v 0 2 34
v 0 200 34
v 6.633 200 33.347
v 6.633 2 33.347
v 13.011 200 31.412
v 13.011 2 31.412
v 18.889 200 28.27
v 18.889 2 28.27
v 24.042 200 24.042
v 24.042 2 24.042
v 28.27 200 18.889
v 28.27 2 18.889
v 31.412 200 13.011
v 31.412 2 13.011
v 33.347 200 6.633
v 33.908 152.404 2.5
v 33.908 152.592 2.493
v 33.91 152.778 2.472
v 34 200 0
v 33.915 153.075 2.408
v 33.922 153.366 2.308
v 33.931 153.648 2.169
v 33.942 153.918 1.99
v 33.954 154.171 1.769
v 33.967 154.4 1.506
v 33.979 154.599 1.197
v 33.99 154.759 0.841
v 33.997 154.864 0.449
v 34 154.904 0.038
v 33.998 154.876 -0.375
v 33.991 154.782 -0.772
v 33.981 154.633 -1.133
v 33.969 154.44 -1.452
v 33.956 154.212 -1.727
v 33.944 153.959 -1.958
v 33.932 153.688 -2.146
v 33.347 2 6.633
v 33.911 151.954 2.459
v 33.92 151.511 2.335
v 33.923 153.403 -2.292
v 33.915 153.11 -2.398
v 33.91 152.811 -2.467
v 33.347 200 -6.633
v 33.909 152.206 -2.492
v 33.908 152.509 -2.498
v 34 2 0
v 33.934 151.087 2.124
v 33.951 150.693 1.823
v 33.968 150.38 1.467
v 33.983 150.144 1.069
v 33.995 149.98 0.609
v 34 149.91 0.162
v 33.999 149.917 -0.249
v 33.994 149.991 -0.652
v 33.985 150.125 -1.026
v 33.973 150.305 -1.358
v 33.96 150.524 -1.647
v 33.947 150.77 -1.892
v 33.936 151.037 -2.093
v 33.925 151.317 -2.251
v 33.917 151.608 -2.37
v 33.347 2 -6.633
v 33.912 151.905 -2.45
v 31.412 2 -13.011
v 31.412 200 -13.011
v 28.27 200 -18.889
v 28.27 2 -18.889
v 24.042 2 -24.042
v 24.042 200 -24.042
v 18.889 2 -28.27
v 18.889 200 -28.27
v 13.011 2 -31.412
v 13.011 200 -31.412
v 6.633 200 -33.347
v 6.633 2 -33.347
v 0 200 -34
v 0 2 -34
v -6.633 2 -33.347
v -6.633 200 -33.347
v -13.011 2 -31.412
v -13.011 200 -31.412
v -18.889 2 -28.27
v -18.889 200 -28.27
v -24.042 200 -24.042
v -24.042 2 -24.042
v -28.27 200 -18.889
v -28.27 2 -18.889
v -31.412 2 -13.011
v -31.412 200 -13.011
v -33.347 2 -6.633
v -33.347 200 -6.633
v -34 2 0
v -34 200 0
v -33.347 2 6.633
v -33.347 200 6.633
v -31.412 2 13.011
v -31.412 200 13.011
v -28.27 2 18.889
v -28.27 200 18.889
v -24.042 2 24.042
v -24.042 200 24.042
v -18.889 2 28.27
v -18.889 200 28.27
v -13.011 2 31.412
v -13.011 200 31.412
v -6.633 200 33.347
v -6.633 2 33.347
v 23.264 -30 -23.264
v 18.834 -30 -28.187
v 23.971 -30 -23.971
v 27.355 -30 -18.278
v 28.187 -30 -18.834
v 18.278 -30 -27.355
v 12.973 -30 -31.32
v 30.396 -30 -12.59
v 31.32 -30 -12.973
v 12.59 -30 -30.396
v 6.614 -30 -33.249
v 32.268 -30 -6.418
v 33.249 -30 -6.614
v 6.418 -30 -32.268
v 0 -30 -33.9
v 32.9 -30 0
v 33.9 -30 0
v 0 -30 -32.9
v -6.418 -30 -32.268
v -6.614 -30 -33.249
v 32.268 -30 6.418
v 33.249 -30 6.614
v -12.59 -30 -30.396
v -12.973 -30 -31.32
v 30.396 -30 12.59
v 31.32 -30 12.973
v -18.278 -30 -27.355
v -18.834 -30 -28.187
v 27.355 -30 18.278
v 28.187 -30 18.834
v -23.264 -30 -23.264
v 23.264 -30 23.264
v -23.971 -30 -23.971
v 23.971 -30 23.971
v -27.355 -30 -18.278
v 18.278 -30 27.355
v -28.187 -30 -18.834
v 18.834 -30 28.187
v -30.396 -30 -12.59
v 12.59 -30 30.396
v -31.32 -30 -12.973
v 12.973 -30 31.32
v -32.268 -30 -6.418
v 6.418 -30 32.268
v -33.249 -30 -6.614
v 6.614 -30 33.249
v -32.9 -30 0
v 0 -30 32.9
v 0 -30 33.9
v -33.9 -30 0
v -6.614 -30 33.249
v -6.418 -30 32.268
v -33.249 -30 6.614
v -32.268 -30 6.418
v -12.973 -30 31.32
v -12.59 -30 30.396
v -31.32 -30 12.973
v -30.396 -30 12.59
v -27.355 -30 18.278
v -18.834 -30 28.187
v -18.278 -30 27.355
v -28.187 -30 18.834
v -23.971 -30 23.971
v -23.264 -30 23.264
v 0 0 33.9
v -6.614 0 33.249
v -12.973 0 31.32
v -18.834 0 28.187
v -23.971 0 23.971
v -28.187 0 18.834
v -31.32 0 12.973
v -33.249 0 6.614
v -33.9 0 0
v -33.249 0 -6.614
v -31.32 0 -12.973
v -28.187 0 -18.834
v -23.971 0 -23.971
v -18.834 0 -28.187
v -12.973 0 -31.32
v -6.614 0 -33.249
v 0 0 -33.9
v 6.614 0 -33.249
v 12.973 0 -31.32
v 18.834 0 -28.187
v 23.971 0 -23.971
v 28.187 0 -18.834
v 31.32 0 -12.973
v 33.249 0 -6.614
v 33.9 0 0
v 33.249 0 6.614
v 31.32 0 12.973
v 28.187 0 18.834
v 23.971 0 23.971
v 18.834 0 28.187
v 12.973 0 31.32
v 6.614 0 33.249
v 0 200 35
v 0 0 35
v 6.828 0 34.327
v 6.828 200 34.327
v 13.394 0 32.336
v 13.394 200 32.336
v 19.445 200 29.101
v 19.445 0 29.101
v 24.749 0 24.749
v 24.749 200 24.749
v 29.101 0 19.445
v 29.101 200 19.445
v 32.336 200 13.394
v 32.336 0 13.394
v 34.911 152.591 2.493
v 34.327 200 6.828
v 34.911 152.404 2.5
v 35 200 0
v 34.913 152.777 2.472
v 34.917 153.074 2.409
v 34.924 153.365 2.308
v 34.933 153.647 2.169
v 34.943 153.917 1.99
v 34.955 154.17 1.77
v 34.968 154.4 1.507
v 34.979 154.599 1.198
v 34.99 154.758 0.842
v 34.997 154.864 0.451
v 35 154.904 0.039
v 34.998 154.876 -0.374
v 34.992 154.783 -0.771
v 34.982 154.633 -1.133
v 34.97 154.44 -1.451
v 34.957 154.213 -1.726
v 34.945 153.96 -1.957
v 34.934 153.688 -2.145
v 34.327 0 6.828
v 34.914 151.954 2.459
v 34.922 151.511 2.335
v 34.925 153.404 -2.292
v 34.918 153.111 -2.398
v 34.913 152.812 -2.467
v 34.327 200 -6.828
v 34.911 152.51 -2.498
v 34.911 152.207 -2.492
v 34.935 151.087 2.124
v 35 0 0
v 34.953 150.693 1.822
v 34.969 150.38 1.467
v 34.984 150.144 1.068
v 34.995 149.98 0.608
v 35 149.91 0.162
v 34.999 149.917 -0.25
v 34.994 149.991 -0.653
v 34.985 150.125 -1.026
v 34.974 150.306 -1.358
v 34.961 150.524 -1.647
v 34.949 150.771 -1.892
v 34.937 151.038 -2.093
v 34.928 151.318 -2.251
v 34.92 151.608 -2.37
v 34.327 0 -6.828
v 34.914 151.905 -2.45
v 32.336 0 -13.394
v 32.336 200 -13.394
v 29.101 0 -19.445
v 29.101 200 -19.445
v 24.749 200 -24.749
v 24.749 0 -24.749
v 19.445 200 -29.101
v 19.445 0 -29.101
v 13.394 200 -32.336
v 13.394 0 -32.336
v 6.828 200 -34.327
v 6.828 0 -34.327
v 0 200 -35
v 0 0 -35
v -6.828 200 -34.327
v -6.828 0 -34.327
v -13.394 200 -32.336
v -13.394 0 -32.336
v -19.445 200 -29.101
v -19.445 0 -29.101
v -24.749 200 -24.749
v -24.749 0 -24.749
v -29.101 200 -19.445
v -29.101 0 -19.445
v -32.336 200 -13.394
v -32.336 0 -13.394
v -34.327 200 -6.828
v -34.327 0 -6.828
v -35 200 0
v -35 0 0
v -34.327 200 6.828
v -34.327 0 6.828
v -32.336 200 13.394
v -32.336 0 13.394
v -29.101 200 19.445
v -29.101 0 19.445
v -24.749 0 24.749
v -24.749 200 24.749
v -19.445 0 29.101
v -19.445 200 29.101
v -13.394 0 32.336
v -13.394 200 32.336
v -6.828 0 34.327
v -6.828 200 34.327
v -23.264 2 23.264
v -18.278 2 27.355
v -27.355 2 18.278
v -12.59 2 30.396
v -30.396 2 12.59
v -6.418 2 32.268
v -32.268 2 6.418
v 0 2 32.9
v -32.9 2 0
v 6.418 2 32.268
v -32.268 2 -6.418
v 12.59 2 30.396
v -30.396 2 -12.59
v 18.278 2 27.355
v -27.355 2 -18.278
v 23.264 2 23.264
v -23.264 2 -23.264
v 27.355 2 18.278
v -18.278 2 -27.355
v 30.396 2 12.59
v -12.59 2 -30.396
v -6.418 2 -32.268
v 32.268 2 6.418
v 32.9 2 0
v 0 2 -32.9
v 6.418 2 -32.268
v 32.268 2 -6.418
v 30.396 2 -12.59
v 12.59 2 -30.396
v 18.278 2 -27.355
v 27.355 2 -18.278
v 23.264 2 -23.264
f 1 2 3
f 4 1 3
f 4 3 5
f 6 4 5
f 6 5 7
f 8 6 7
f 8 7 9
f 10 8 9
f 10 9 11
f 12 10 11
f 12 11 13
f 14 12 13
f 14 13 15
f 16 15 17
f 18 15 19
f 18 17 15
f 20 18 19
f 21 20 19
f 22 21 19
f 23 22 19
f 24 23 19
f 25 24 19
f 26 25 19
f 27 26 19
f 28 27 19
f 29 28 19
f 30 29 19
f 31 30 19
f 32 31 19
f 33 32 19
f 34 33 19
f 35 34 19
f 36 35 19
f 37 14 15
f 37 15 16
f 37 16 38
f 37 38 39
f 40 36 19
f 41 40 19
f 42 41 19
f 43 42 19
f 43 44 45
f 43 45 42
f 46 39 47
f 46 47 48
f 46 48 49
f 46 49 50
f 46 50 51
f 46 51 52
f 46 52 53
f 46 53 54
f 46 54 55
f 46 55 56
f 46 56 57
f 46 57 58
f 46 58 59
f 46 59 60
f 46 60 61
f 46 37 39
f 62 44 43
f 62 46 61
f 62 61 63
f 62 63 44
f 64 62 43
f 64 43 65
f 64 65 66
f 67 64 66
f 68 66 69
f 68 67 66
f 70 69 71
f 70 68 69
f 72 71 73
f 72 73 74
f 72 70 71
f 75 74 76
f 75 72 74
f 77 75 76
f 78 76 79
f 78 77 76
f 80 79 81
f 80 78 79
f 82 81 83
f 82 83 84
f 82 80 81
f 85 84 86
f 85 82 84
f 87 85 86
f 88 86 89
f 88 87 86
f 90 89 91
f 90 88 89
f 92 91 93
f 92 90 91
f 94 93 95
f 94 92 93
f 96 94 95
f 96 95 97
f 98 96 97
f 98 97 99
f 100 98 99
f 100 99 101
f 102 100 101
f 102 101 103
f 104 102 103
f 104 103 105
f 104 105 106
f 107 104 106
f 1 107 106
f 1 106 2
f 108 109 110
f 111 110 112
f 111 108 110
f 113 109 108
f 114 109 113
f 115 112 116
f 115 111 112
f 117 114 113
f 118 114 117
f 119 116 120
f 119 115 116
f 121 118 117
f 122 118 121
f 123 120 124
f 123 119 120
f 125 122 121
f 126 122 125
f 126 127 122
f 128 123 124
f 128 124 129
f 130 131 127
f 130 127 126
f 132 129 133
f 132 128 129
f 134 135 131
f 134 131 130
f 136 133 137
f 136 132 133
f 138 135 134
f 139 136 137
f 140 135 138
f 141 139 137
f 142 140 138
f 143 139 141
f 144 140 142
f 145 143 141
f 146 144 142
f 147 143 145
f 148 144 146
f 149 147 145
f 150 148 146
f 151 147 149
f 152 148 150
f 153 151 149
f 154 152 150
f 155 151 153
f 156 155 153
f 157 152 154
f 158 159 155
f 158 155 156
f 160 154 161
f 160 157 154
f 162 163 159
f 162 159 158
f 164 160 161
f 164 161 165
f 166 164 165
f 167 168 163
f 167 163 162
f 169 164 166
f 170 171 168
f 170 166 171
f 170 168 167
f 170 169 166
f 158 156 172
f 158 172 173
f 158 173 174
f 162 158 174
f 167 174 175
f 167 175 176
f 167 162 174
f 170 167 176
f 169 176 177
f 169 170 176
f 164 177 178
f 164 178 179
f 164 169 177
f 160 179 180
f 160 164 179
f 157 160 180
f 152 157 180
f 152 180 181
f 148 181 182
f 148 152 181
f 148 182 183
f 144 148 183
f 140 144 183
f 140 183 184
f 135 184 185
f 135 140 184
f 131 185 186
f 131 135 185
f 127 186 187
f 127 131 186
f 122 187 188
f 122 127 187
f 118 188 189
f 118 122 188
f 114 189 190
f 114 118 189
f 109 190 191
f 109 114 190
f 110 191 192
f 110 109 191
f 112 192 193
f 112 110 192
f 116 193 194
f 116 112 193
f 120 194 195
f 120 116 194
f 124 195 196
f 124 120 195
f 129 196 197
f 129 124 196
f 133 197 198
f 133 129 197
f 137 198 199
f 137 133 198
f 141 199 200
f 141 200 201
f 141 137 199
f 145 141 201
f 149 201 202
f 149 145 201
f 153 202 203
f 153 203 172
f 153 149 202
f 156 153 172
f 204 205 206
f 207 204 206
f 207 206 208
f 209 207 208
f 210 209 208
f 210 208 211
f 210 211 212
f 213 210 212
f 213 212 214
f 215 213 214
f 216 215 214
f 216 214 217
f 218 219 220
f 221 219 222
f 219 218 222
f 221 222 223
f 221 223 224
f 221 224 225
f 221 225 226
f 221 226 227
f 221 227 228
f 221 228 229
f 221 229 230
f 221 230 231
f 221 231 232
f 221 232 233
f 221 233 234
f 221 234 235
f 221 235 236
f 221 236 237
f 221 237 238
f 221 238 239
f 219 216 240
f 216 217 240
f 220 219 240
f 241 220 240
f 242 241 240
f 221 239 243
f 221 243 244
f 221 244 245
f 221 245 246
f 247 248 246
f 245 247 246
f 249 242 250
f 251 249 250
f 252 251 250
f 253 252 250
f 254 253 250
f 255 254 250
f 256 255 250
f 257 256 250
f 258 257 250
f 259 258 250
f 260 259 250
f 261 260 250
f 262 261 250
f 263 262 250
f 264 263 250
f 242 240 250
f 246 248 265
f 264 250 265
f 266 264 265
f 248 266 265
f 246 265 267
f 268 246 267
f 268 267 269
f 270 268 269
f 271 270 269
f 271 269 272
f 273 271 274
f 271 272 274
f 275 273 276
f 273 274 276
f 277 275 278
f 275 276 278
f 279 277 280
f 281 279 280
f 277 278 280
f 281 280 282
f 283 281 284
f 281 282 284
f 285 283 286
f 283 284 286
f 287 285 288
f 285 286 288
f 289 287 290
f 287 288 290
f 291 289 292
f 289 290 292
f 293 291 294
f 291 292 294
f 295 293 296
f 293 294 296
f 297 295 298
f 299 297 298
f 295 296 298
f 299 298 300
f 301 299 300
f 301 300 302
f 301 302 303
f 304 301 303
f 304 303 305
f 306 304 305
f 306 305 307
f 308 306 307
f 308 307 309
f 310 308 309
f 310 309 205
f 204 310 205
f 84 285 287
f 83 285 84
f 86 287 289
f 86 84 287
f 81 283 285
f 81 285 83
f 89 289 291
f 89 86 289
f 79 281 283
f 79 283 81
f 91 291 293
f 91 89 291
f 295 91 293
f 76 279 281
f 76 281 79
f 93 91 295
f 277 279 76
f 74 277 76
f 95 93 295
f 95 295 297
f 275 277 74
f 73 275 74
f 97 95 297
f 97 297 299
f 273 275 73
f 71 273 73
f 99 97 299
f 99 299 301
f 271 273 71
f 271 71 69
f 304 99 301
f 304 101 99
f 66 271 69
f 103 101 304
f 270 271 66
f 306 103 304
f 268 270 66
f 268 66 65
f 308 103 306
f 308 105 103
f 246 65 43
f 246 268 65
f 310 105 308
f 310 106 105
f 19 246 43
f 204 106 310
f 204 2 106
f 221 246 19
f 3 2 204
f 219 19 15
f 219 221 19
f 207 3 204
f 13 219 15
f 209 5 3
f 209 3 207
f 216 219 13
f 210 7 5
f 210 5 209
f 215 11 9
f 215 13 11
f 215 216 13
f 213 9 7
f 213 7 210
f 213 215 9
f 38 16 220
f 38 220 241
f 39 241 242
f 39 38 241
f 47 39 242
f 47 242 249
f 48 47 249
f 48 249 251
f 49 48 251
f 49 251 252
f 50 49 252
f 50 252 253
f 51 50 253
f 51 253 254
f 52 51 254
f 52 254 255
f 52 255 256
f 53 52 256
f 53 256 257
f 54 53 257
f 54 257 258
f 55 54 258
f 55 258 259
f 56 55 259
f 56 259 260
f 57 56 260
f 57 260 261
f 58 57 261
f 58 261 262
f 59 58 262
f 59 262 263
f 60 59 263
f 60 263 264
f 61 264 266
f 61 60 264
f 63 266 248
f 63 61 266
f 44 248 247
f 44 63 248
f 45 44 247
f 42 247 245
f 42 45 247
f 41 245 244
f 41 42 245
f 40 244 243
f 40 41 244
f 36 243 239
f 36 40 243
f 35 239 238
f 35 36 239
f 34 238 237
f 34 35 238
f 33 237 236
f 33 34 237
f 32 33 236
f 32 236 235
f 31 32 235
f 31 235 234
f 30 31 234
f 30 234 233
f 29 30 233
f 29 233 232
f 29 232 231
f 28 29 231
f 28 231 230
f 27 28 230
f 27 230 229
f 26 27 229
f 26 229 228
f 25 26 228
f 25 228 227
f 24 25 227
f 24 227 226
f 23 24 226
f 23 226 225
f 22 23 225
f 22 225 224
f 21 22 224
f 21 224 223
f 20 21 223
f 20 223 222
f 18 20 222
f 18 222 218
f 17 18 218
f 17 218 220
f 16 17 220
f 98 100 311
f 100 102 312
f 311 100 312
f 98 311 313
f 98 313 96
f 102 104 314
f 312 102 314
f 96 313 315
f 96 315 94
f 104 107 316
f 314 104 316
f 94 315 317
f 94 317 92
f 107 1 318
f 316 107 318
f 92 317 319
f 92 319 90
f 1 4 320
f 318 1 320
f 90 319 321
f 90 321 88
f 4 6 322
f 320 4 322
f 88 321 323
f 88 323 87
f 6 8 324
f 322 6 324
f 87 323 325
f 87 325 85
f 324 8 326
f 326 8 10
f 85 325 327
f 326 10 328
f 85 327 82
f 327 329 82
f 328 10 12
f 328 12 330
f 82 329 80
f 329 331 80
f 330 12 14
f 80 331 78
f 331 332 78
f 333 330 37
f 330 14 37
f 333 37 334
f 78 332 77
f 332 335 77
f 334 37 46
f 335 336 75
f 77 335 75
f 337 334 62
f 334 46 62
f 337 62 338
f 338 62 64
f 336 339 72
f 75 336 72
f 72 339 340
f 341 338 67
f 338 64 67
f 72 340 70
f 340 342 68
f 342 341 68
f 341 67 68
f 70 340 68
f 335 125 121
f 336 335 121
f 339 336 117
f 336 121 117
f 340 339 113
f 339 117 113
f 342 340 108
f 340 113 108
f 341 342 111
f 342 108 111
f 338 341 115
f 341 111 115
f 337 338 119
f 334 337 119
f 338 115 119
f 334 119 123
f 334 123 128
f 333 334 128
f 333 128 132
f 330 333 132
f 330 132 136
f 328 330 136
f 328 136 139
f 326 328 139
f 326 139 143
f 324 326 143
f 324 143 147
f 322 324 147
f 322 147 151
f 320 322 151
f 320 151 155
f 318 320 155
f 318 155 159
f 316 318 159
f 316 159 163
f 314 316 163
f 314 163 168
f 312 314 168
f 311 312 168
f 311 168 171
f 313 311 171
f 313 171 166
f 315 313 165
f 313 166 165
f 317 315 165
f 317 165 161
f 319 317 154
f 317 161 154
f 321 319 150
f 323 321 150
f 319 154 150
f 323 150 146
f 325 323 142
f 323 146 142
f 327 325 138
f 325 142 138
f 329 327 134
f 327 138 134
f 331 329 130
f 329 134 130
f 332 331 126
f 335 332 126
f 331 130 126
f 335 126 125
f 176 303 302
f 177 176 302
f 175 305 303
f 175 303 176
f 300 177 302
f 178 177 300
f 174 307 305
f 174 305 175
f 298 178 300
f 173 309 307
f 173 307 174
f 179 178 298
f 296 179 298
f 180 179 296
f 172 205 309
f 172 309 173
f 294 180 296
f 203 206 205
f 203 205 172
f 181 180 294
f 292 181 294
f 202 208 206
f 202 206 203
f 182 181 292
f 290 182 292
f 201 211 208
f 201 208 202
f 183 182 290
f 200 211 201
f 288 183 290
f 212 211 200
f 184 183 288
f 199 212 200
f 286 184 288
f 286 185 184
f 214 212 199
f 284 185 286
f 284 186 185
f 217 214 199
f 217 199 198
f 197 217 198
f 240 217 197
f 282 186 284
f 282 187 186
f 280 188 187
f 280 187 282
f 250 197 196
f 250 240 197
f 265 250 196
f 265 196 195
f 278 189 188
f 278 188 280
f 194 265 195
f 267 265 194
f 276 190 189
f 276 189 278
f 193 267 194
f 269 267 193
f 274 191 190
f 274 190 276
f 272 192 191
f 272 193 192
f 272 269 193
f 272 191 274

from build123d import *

# Parameters (mm, degrees)
SKETCH1_R           = 35
SKETCH1_R_2         = 34
BOSS_EXTRUDE1_DEPTH = 200
SKETCH2_R           = 34
SKETCH2_R_2         = 32.9
BOSS_EXTRUDE2_DEPTH = 2
BOSS_EXTRUDE3_START = 30
SKETCH3_R           = 33.9
SKETCH3_R_2         = 32.9
BOSS_EXTRUDE3_DEPTH = 30
SKETCH4_R           = 2.5
CUT_EXTRUDE1_DEPTH  = 40


with BuildPart() as part:
    # Sketch1 → Boss-Extrude1 (new body)
    with BuildSketch(Plane(origin=(0, 0, 0), x_dir=(1, 0, 0), z_dir=(0, 1, 0))):
        with Locations(Location((0, 0, 0), (0, 0, 270))):
            Circle(SKETCH1_R)
        with Locations(Location((0, 0, 0), (0, 0, 270))):
            Circle(SKETCH1_R_2, mode=Mode.SUBTRACT)
    extrude(amount=BOSS_EXTRUDE1_DEPTH)

    # Sketch2 → Boss-Extrude2 (add)
    with BuildSketch(Plane.XZ):
        with Locations(Location((0, 0, 0), (0, 0, 270))):
            Circle(SKETCH2_R)
        with Locations(Location((0, 0, 0), (0, 0, 270))):
            Circle(SKETCH2_R_2, mode=Mode.SUBTRACT)
    extrude(amount=-BOSS_EXTRUDE2_DEPTH)

    # Sketch3 → Boss-Extrude3 (add)
    with BuildSketch(Plane.XZ.offset(BOSS_EXTRUDE3_START)):
        with Locations(Location((0, 0, 0), (0, 0, 90))):
            Circle(SKETCH3_R)
        with Locations(Location((0, 0, 0), (0, 0, 270))):
            Circle(SKETCH3_R_2, mode=Mode.SUBTRACT)
    extrude(amount=-BOSS_EXTRUDE3_DEPTH)

    # Sketch4 → Cut-Extrude1 (cut)
    with BuildSketch(Plane(origin=(0, 0, 0), x_dir=(0, 0, -1), z_dir=(1, 0, 0))):
        with Locations(Location((0, 152.404493748, 0), (0, 0, 180))):
            Circle(SKETCH4_R)
    extrude(amount=CUT_EXTRUDE1_DEPTH, mode=Mode.SUBTRACT)


solid = part.part
